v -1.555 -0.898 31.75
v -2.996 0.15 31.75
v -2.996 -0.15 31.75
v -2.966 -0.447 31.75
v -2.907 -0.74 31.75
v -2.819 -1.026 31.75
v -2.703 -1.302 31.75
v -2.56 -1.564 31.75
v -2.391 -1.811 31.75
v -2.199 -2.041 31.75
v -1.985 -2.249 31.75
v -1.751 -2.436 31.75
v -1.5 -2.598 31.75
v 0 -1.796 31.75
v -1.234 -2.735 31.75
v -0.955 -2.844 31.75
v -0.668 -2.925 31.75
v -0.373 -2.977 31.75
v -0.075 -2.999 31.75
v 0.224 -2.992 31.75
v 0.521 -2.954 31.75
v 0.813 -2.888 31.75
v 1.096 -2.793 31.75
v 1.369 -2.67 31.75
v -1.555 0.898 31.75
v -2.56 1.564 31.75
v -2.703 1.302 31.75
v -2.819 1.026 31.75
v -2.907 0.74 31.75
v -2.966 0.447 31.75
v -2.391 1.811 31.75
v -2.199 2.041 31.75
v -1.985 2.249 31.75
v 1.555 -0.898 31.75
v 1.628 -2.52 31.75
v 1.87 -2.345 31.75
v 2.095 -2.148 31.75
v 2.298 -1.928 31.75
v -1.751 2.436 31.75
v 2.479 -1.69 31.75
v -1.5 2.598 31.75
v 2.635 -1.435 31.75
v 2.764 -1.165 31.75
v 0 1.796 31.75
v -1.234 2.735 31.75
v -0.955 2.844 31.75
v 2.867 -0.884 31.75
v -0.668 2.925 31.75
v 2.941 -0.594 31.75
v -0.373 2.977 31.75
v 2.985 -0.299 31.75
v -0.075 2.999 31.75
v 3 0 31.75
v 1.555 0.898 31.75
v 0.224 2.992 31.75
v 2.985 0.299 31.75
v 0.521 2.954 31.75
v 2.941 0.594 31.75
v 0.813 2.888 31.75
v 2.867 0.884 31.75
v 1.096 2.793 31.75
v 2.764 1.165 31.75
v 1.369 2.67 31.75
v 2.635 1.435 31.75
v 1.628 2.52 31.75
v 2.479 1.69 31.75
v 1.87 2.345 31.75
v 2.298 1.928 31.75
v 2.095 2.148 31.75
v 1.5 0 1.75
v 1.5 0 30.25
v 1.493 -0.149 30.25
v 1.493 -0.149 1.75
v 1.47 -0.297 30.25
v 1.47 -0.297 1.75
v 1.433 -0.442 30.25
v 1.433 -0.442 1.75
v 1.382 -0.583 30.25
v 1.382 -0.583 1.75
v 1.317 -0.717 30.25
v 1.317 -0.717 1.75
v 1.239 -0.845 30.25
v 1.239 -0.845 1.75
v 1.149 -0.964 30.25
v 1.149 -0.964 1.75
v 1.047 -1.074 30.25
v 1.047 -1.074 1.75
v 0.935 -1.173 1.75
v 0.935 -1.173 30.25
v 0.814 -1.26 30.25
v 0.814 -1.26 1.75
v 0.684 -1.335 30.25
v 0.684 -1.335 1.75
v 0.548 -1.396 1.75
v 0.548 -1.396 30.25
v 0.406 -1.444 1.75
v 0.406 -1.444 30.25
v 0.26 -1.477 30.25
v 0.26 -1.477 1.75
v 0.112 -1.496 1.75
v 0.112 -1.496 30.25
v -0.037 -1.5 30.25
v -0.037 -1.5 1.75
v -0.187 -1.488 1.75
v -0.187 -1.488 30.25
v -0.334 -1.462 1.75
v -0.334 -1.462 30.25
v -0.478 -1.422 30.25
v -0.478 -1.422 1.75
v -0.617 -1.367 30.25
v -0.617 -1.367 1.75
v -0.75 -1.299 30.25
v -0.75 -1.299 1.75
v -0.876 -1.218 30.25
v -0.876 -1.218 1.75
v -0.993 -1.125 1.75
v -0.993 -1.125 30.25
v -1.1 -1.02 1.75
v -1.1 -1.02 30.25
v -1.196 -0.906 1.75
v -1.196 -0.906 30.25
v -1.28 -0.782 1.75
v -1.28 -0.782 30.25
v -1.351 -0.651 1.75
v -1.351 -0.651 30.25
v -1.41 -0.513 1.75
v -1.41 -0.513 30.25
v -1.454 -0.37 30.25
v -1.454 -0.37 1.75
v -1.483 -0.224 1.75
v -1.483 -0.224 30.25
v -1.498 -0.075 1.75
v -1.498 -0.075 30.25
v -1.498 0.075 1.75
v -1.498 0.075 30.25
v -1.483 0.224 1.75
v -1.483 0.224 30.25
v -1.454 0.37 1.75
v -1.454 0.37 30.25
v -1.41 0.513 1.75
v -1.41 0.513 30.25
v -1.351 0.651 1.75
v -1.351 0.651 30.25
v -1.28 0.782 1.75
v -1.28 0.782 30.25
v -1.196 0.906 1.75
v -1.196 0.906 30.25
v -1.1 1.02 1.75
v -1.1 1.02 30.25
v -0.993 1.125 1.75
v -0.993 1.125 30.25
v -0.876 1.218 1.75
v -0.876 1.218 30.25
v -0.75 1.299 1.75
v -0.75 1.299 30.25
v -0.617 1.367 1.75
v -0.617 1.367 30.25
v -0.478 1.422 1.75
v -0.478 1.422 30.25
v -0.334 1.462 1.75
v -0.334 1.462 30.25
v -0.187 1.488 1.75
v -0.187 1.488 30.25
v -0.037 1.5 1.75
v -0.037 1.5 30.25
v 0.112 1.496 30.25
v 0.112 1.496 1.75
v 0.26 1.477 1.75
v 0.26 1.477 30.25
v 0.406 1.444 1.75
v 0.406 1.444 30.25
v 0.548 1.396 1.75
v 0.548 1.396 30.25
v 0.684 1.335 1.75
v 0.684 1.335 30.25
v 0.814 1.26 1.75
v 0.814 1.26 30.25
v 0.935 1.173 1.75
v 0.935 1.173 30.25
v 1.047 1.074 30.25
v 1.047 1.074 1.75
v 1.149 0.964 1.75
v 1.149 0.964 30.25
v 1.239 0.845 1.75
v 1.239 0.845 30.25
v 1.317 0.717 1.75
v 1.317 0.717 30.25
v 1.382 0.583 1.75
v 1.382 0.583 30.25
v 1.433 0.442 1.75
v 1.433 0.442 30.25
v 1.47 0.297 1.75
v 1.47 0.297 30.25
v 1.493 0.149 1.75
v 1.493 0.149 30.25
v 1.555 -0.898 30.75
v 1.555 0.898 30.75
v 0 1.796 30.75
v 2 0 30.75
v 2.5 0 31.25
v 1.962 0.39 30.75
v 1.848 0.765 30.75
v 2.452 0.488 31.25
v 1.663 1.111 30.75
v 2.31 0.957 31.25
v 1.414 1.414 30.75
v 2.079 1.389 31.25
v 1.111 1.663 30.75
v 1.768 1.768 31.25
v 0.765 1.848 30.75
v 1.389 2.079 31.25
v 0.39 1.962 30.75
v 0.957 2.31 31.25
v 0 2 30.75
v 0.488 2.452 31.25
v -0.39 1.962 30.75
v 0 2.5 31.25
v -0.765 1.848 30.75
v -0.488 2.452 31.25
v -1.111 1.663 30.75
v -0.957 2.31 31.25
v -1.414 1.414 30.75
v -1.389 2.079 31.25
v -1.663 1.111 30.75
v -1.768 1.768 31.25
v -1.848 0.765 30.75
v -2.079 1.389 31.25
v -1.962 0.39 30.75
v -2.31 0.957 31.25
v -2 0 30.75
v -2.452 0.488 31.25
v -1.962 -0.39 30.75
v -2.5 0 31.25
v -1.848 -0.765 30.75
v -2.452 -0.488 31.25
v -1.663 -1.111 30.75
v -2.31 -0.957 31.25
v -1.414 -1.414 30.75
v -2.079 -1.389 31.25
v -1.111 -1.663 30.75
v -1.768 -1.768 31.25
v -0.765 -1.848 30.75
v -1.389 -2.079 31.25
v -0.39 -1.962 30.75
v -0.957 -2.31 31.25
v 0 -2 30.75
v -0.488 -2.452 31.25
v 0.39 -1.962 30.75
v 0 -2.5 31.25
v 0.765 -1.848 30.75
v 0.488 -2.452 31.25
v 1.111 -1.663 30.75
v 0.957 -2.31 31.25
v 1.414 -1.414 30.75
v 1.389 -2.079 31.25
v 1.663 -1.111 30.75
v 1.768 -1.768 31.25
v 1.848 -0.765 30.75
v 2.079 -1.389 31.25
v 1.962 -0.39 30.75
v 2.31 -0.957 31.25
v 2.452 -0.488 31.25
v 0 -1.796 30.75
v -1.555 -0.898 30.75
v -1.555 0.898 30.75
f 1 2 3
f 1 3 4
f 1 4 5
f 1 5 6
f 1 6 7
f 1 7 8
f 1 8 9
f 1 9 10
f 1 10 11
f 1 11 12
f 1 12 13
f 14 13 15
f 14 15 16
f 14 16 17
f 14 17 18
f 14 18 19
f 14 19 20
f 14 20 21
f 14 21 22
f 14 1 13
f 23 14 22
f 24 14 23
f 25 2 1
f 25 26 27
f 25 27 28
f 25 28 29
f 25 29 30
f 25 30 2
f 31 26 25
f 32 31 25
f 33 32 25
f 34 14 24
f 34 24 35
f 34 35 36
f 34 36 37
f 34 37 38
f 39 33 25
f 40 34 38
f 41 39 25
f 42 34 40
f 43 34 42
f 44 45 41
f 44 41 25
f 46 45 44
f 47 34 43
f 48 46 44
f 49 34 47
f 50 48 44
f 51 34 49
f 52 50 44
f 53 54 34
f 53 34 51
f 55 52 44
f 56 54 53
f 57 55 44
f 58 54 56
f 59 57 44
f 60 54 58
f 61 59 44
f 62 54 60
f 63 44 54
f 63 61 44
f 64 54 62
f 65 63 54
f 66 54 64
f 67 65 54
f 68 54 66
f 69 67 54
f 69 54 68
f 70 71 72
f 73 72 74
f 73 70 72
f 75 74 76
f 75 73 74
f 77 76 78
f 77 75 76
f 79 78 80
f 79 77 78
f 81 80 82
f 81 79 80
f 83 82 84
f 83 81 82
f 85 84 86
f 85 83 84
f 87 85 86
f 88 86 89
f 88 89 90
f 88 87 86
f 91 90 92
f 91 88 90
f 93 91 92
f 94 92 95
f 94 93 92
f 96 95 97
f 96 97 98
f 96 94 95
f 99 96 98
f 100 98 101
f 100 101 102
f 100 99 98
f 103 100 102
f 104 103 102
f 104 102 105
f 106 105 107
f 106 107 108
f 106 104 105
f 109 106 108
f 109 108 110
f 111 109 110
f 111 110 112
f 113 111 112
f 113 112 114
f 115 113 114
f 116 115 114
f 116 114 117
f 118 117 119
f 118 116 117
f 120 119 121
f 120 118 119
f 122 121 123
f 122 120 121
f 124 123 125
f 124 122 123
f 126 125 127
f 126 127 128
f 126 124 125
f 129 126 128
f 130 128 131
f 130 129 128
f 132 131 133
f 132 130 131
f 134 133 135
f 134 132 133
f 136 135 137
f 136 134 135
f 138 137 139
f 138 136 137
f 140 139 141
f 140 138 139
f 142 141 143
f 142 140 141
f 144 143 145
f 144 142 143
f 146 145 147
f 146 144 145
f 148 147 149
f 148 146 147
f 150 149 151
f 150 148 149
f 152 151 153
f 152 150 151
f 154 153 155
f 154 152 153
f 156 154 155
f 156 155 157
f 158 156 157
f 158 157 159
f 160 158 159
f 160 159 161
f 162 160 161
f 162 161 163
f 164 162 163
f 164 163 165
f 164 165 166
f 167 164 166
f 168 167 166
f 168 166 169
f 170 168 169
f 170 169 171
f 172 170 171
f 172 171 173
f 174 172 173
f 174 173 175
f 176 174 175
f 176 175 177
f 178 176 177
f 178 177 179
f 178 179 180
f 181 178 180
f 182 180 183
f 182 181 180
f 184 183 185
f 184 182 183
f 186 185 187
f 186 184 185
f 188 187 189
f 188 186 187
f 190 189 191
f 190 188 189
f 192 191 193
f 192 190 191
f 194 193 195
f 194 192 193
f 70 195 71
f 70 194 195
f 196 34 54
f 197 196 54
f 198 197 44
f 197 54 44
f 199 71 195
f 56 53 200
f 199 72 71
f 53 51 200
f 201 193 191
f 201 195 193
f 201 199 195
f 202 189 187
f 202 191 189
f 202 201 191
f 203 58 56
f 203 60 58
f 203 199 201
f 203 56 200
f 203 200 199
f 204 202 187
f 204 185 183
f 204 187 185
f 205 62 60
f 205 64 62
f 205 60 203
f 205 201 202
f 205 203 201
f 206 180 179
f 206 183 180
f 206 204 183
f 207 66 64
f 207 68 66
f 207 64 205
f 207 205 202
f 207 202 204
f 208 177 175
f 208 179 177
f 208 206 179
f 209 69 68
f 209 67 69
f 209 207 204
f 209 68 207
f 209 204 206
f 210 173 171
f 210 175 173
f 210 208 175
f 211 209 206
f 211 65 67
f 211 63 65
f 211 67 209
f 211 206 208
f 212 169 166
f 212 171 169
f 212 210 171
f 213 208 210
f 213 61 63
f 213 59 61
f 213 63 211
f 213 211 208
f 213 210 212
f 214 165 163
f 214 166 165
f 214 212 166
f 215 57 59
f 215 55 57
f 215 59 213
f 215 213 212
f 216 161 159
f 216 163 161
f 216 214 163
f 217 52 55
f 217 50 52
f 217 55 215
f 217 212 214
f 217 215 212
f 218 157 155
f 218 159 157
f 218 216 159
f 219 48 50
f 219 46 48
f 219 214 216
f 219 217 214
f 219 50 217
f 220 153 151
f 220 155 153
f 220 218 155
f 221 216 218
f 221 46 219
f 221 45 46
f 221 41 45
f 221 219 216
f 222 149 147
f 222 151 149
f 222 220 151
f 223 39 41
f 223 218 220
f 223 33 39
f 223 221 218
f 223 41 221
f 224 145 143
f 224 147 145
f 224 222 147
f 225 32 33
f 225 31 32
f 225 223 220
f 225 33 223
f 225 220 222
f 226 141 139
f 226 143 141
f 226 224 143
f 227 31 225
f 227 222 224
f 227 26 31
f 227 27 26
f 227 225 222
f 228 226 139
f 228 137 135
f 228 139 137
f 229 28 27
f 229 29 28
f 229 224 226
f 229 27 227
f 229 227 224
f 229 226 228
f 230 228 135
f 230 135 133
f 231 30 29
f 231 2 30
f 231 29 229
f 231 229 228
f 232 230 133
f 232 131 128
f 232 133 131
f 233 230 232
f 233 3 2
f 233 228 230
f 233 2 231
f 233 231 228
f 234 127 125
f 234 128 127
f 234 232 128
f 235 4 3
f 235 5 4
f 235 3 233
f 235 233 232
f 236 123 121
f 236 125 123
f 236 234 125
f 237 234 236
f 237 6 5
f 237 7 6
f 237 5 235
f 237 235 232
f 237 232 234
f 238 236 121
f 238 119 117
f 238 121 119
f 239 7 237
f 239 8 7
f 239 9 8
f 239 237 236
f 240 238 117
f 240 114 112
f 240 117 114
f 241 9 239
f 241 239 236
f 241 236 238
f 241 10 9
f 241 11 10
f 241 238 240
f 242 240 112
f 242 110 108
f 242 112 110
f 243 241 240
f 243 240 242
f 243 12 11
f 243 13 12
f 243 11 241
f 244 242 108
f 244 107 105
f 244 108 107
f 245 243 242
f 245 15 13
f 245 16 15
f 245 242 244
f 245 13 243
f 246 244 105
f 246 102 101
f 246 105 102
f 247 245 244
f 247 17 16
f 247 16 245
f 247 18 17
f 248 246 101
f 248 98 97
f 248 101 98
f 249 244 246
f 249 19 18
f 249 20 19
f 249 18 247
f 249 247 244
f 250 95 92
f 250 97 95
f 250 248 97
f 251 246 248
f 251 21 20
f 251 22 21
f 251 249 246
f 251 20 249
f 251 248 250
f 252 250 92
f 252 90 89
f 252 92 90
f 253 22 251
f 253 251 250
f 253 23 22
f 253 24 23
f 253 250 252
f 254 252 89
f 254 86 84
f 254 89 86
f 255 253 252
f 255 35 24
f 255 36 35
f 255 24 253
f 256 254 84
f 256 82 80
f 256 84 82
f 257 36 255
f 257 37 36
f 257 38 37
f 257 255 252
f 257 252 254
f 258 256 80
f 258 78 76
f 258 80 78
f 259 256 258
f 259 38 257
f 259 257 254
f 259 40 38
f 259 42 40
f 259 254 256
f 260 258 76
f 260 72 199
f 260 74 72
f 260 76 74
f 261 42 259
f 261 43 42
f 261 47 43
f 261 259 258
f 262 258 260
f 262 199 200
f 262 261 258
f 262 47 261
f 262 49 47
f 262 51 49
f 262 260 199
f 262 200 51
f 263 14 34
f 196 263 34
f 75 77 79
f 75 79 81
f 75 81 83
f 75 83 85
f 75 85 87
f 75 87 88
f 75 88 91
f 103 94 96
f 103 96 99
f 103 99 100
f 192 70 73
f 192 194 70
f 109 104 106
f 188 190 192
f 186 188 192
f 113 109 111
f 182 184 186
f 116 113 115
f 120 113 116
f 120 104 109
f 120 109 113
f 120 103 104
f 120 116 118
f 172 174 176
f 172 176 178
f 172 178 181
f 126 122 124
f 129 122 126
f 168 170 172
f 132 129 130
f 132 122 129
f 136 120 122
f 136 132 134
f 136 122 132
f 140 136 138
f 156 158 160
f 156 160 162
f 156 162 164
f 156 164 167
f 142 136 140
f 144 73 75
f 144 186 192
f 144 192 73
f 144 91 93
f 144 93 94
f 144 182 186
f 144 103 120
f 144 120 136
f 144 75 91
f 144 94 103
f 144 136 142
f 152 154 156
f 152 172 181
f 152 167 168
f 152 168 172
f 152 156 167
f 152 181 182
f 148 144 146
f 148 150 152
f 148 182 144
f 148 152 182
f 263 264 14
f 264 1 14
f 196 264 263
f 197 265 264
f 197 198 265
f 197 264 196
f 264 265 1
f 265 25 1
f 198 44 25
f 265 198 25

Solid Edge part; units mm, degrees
sketch "Sketch1" plane through (0, 0, 0) normal (0, 0, 1) x (1, 0, 0)
  circle A0 centre (0, 0) radius 1.5
extrude "Protrusion1" add sketch "Sketch1" along normal blind 30
sketch "Sketch2" plane through (0, 0, 30) normal (0, 0, 1) x (1, 0, 0)
  circle A0 centre (0, 0) radius 3
extrude "ExtrudedProtrusion_2" add sketch "Sketch2" along normal blind 1.75
chamfer "Chamfer_1" distance 1.75 angle 45 1 edges at (-3, 0, 30)
sketch "Sketch3" plane through (0, 0, 31.75) normal (0, 0, 1) x (0, 1, 0)
  line L0 (0.8978, -1.555) -> (1.7956, 0)
  line L1 (1.7956, 0) -> (0.8978, 1.555)
  line L2 (0.8978, 1.555) -> (-0.8978, 1.555)
  line L3 (-0.8978, 1.555) -> (-1.7956, 0)
  line L4 (-1.7956, 0) -> (-0.8978, -1.555)
  line L5 (-0.8978, -1.555) -> (0.8978, -1.555)
extrude "ExtrudedCutout_1" cut sketch "Sketch3" against normal blind 1
sketch "Sketch4" plane through (0, 0, 0) normal (0, 0, -1) x (0, 1, 0)
  circle A0 centre (0, 0) radius 1.6599
extrude "ExtrudedCutout_2" cut sketch "Sketch4" against normal blind 1.75
properties material "Iron, grey cast type 20"
